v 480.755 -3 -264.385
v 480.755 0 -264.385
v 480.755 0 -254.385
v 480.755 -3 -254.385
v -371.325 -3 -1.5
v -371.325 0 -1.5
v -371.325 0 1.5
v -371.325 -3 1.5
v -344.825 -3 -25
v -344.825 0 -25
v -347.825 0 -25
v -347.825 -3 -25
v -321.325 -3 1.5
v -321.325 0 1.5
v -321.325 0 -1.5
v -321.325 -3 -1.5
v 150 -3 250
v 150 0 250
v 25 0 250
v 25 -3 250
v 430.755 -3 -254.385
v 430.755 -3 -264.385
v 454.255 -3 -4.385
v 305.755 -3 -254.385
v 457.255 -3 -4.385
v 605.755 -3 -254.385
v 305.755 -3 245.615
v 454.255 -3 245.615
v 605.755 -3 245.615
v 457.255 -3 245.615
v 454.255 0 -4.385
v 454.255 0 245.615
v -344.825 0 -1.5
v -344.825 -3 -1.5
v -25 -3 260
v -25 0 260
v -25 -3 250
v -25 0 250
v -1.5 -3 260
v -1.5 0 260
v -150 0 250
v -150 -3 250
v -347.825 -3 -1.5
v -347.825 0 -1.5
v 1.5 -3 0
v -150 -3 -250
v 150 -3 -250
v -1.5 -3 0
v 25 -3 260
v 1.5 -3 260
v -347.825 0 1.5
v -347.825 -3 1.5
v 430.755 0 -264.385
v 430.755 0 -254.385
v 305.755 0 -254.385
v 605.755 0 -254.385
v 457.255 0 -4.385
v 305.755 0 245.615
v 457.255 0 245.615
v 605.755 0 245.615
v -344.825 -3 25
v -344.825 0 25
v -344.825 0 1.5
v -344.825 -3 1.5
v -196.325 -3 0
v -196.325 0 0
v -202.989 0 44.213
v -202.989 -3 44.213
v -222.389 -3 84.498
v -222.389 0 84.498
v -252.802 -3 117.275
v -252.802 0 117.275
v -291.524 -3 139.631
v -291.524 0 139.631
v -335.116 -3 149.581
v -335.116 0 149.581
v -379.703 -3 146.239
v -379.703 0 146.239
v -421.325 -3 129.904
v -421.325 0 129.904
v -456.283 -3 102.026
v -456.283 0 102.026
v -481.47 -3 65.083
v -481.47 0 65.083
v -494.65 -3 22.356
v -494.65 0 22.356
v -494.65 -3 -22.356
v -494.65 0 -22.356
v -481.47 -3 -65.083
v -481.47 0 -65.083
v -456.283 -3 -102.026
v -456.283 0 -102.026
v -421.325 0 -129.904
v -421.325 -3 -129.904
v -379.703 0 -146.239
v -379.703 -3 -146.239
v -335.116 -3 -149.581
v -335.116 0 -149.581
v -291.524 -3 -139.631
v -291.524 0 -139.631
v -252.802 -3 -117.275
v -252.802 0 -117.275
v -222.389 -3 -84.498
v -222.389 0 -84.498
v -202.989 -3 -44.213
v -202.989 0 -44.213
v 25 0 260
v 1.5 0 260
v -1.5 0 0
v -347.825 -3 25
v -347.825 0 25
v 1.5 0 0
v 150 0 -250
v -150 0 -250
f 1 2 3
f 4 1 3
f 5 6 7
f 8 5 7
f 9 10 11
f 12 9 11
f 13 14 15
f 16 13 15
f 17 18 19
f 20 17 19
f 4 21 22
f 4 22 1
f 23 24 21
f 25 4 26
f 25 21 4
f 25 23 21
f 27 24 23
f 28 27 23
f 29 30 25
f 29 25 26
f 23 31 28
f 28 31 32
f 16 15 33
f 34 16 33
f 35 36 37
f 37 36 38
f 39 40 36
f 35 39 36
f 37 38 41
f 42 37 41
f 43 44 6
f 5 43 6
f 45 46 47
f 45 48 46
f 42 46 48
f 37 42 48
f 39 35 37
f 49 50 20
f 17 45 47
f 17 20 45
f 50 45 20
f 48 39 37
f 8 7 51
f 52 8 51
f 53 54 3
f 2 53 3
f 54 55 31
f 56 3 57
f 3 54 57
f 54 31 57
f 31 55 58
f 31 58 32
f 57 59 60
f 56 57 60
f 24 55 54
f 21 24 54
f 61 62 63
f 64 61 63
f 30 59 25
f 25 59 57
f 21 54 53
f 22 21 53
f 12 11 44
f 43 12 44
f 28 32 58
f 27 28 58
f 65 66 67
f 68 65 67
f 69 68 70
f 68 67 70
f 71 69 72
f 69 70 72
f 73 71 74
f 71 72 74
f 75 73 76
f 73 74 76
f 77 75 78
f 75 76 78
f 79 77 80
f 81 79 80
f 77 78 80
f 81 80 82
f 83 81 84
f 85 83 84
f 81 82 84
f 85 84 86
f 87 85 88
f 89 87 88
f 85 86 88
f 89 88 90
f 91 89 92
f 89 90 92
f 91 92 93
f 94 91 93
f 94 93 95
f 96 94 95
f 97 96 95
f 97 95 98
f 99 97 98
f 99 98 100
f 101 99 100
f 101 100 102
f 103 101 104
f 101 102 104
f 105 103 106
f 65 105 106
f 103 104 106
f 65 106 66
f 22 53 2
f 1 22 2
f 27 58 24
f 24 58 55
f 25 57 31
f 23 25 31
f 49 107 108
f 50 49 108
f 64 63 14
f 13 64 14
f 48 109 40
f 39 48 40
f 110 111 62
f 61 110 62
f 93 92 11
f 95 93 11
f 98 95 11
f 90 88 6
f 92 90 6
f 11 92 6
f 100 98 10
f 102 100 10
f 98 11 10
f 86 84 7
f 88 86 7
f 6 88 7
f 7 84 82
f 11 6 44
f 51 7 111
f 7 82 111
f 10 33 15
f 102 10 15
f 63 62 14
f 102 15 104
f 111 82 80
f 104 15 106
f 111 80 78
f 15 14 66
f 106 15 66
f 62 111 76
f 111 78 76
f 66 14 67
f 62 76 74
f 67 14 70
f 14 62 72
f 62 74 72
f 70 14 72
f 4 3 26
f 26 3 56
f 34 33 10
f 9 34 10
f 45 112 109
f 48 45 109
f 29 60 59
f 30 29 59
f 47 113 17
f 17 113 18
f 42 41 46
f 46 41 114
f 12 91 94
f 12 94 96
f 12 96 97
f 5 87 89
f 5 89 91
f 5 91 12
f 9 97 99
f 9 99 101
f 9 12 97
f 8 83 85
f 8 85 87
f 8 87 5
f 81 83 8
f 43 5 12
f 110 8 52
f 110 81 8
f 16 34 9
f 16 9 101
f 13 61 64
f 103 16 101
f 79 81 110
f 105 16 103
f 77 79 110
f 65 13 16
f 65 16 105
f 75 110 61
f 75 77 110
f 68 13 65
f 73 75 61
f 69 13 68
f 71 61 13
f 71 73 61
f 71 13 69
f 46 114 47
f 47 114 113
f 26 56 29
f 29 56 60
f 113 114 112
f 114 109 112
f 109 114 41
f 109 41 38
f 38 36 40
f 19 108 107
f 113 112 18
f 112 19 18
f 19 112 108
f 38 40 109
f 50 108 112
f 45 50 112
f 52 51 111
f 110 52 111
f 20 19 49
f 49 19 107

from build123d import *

# Parameters (mm, degrees)
F1_DEPTH = 3
F2_R     = 150
F3_DEPTH = 3


with BuildPart() as f1:
    # F0 (on Front) → F1 (new body)
    with BuildSketch(Plane.XZ):
        Polygon((-150, 250), (-150, -250), (150, -250), (150, 250), (25, 250), (25, 260), (1.5, 260), (1.5, 250), (1.5, 0), (-1.5, 0), (-1.5, 250), (-1.5, 260), (-25, 260), (-25, 250), align=None)
        Polygon((305.754572, 245.614678), (305.754572, -254.385322), (430.754572, -254.385322), (430.754572, -264.385322), (454.254572, -264.385322), (457.254572, -264.385322), (480.754572, -264.385322), (480.754572, -254.385322), (605.754572, -254.385322), (605.754572, 245.614678), (480.754572, 245.614678), (457.254572, 245.614678), (457.254572, -4.385322), (454.254572, -4.385322), (454.254572, 245.614678), (430.754572, 245.614678), align=None)
    extrude(amount=F1_DEPTH)


with BuildPart() as f3:
    # F2 (on Front) → F3 (new body)
    with BuildSketch(Plane.XZ):
        with Locations((-346.325147, 0)):
            Circle(F2_R)
        Polygon((-347.825147, -1.5), (-371.325147, -1.5), (-371.325147, 1.5), (-347.825147, 1.5), (-347.825147, 25), (-344.825147, 25), (-344.825147, 1.5), (-321.325147, 1.5), (-321.325147, -1.5), (-344.825147, -1.5), (-344.825147, -25), (-347.825147, -25), align=None, mode=Mode.SUBTRACT)
    extrude(amount=F3_DEPTH)


solid = Compound([f1.part, f3.part])
